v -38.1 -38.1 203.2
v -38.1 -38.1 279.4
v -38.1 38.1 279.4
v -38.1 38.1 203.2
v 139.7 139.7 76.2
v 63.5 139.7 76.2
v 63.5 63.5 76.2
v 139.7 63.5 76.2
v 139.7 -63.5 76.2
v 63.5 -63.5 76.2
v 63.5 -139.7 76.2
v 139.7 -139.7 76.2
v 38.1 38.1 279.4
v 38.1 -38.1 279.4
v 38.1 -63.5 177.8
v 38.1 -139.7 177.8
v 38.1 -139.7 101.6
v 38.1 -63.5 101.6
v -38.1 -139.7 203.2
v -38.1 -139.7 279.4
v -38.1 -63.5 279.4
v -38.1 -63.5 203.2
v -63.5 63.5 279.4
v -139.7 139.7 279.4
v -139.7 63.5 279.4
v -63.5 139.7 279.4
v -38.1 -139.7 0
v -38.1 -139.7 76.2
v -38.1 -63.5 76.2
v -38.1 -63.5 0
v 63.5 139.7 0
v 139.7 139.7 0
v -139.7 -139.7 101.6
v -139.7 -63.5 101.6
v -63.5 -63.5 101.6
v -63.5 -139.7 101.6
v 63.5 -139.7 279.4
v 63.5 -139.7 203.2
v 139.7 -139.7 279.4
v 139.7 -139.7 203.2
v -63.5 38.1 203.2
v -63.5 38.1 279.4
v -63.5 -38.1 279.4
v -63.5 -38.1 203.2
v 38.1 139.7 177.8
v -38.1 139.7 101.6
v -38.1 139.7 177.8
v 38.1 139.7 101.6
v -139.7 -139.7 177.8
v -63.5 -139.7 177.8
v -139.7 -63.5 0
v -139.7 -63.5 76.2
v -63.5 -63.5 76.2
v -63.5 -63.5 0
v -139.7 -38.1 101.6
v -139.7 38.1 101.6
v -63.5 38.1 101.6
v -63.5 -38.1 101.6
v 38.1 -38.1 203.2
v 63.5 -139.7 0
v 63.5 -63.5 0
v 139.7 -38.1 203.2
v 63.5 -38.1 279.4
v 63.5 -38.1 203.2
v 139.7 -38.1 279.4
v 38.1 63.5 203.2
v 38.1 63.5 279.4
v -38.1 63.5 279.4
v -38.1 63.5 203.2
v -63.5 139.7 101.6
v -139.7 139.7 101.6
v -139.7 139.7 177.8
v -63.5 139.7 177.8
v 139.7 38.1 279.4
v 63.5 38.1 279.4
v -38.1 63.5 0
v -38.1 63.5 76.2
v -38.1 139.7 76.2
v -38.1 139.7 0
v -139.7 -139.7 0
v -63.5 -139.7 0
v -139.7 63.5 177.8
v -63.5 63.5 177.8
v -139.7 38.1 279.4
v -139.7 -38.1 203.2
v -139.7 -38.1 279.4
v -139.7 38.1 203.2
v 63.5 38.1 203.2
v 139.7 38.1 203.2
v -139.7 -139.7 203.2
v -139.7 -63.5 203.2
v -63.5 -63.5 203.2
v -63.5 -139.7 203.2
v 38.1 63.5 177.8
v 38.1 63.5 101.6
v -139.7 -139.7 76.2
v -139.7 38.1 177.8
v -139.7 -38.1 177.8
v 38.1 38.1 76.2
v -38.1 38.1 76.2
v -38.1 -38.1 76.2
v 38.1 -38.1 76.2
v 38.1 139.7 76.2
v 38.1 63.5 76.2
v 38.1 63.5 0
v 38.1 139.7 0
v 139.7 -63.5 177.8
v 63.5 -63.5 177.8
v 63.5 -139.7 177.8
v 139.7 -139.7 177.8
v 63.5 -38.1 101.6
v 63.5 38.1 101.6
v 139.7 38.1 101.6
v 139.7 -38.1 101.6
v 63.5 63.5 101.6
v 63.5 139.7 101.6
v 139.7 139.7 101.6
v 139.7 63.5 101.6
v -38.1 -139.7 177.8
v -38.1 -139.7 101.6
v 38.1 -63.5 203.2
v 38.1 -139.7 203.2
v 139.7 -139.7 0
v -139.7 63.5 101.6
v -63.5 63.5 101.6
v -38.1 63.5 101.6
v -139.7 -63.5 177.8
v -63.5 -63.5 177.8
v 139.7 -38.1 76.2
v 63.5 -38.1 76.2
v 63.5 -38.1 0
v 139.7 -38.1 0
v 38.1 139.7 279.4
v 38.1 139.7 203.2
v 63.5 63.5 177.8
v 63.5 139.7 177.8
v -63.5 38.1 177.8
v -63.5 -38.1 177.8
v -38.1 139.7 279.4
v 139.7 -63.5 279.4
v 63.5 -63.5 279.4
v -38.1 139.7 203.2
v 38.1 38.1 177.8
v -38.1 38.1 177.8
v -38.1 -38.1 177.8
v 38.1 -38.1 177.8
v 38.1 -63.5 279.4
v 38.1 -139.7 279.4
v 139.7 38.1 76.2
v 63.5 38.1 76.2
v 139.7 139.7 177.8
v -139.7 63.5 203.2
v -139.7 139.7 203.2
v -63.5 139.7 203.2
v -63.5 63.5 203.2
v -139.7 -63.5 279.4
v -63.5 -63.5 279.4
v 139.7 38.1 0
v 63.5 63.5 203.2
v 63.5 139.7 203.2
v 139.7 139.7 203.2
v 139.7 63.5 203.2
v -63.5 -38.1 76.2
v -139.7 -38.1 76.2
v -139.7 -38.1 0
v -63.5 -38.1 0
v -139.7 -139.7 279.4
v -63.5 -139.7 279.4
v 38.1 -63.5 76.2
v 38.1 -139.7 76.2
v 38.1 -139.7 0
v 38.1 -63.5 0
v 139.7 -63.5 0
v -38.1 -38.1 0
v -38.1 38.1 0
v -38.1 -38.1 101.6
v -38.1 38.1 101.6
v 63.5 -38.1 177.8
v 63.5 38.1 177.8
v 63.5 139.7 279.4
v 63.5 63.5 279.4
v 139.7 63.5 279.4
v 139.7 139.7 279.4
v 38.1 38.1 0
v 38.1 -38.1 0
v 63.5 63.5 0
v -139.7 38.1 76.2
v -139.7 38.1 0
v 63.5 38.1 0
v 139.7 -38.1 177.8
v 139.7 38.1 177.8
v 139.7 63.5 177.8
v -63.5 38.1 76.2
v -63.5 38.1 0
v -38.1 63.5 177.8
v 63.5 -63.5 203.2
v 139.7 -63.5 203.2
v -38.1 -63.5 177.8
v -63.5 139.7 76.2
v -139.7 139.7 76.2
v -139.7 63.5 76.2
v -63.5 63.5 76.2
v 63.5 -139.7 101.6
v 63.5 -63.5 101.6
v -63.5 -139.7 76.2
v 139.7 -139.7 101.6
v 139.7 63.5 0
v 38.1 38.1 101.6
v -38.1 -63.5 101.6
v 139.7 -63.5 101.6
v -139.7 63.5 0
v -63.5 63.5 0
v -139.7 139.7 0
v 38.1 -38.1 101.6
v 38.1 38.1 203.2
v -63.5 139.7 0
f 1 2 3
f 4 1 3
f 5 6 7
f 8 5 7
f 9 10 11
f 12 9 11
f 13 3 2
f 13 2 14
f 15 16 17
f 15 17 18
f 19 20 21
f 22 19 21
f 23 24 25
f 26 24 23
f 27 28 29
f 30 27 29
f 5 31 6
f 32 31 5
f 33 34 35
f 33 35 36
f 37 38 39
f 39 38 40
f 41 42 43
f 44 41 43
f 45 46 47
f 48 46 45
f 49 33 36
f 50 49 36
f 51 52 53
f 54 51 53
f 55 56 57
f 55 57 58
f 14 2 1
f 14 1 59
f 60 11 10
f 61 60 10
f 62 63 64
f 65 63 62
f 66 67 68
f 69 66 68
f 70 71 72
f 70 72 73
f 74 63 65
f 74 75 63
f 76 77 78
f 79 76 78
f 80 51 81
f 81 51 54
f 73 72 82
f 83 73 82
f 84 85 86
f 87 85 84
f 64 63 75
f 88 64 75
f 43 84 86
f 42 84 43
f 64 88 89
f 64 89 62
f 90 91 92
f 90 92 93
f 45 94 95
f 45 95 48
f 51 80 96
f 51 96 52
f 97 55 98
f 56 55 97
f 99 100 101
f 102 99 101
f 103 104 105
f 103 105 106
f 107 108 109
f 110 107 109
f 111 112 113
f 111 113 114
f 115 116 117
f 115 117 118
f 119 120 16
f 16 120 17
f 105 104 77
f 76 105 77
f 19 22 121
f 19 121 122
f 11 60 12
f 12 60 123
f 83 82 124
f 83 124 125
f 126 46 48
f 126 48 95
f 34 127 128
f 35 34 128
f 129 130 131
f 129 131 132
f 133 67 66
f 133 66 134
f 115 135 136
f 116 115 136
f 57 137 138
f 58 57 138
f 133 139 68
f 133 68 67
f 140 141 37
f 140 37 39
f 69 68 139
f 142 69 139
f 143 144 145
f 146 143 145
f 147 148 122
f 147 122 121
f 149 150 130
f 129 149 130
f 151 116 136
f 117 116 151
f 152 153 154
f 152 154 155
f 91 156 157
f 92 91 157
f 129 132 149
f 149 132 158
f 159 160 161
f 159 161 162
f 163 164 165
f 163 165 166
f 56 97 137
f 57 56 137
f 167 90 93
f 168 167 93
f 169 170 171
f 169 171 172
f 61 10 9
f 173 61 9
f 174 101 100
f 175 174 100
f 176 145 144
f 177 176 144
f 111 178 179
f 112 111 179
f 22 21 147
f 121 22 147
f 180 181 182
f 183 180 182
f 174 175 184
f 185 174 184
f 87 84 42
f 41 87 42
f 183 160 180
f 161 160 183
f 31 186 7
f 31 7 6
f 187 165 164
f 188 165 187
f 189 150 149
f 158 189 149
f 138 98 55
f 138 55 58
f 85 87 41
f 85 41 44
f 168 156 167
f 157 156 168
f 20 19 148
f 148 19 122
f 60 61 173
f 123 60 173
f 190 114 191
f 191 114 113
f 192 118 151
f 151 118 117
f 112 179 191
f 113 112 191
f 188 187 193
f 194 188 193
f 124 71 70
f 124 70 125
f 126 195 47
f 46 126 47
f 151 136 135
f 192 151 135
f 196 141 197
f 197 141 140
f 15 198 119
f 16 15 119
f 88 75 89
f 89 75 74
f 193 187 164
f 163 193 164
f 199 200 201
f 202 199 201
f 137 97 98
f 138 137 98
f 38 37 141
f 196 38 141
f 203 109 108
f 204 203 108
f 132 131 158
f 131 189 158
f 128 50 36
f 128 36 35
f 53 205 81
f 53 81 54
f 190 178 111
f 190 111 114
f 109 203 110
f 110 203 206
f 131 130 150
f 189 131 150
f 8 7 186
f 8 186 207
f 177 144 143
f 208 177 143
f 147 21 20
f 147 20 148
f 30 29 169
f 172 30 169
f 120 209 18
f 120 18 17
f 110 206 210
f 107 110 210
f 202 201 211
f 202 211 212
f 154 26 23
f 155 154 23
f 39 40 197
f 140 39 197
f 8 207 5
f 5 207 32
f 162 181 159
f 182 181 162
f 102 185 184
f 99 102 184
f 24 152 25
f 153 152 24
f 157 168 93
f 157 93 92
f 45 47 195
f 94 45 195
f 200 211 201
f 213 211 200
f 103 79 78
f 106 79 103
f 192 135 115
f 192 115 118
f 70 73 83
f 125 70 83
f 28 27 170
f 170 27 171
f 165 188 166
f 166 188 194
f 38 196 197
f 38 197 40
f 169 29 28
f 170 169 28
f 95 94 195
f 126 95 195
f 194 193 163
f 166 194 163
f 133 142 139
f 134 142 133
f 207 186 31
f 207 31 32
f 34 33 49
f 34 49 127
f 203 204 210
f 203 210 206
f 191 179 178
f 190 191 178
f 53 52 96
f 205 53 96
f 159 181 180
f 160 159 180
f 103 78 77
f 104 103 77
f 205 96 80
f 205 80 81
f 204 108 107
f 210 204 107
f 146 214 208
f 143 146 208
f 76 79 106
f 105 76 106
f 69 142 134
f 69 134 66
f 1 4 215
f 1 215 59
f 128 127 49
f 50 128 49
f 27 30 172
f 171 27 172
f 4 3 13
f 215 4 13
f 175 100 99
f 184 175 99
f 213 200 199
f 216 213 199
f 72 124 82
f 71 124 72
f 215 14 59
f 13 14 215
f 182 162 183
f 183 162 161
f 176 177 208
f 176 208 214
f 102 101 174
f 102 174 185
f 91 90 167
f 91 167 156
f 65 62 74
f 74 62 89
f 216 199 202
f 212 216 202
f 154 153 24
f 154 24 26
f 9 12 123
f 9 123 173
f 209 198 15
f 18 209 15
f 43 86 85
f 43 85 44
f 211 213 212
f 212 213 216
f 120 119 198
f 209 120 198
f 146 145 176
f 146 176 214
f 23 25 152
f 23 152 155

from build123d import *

# Parameters (mm, degrees)
F0_W      = 279.4
F0_H      = 279.4
F1_DEPTH  = 279.4
F2_W      = 25.4
F2_H      = 76.2
F2_H_2    = 25.4
F2_W_2    = 76.2
F3_DEPTH  = 279.4
F4_W      = 76.2
F4_H      = 25.4
F5_DEPTH  = 533.4
F6_W      = 76.2
F6_H      = 25.4
F7_DEPTH  = 533.4
F8_W      = 76.2
F8_H      = 25.4
F9_DEPTH  = 81838.8
F10_W     = 76.2
F10_H     = 25.4
F11_DEPTH = 1752.6
F12_W     = 76.2
F12_H     = 25.4
F13_DEPTH = 50876.2
F14_W     = 76.2
F14_H     = 25.4
F15_DEPTH = 10668
F16_W     = 76.2
F16_H     = 25.4
F17_DEPTH = 33959.8
F18_W     = 76.2
F18_H     = 25.4
F19_DEPTH = 132969
F20_W     = 76.2
F20_H     = 25.4
F21_DEPTH = 50850.8


with BuildPart() as f1:
    # F0 (on Top) → F1 (new body)
    with BuildSketch(Plane.XY):
        Rectangle(F0_W, F0_H)
    extrude(amount=F1_DEPTH)

    # F2 (on face) → F3 (cut)
    with BuildSketch(Plane.XY.offset(279.4)):
        with Locations((-50.8, 101.6)):
            Rectangle(F2_W, F2_H)
        with Locations((-50.8, 50.8)):
            Rectangle(F2_W, F2_H_2)
        with Locations((-101.6, 50.8)):
            Rectangle(F2_W_2, F2_H_2)
        with Locations((0, 50.8)):
            Rectangle(F2_W_2, F2_H_2)
        with Locations((-50.8, 0)):
            Rectangle(F2_W, F2_H)
        with Locations((50.8, 50.8)):
            Rectangle(F2_W, F2_H_2)
        with Locations((50.8, 101.6)):
            Rectangle(F2_W, F2_H)
        with Locations((-50.8, -50.8)):
            Rectangle(F2_W, F2_H_2)
        with Locations((-101.6, -50.8)):
            Rectangle(F2_W_2, F2_H_2)
        with Locations((0, -50.8)):
            Rectangle(F2_W_2, F2_H_2)
        with Locations((50.8, 0)):
            Rectangle(F2_W, F2_H)
        with Locations((101.6, 50.8)):
            Rectangle(F2_W_2, F2_H_2)
        with Locations((-50.8, -101.6)):
            Rectangle(F2_W, F2_H)
        with Locations((50.8, -50.8)):
            Rectangle(F2_W, F2_H_2)
        with Locations((50.8, -101.6)):
            Rectangle(F2_W, F2_H)
        with Locations((101.6, -50.8)):
            Rectangle(F2_W_2, F2_H_2)
    extrude(amount=-F3_DEPTH, mode=Mode.SUBTRACT)

    # F4 (on face) → F5 (cut)
    with BuildSketch(Plane(origin=(-139.7, 0, 0), x_dir=(0, -1, 0), z_dir=(-1, 0, 0))):
        with Locations((-101.6, 190.5)):
            Rectangle(F4_W, F4_H)
        with Locations((-101.6, 88.9)):
            Rectangle(F4_W, F4_H)
    extrude(amount=-F5_DEPTH, mode=Mode.SUBTRACT)

    # F6 (on face) → F7 (cut)
    with BuildSketch(Plane(origin=(-38.1, 0, 0), x_dir=(0, -1, 0), z_dir=(-1, 0, 0))):
        with Locations((-101.6, 190.5)):
            Rectangle(F6_W, F6_H)
        with Locations((-101.6, 88.9)):
            Rectangle(F6_W, F6_H)
    extrude(amount=-F7_DEPTH, mode=Mode.SUBTRACT)

    # F8 (on face) → F9 (cut)
    with BuildSketch(Plane(origin=(63.5, 0, 0), x_dir=(0, -1, 0), z_dir=(-1, 0, 0))):
        with Locations((-101.6, 190.5)):
            Rectangle(F8_W, F8_H)
        with Locations((-101.6, 88.9)):
            Rectangle(F8_W, F8_H)
    extrude(amount=-F9_DEPTH, mode=Mode.SUBTRACT)

    # F10 (on face) → F11 (cut)
    with BuildSketch(Plane(origin=(-139.7, 0, 0), x_dir=(0, -1, 0), z_dir=(-1, 0, 0))):
        with Locations((0, 190.5)):
            Rectangle(F10_W, F10_H)
        with Locations((0, 88.9)):
            Rectangle(F10_W, F10_H)
    extrude(amount=-F11_DEPTH, mode=Mode.SUBTRACT)

    # F12 (on face) → F13 (cut)
    with BuildSketch(Plane(origin=(-38.1, 0, 0), x_dir=(0, -1, 0), z_dir=(-1, 0, 0))):
        with Locations((0, 190.5)):
            Rectangle(F12_W, F12_H)
        with Locations((0, 88.9)):
            Rectangle(F12_W, F12_H)
    extrude(amount=-F13_DEPTH, mode=Mode.SUBTRACT)

    # F14 (on face) → F15 (cut)
    with BuildSketch(Plane(origin=(63.5, 0, 0), x_dir=(0, -1, 0), z_dir=(-1, 0, 0))):
        with Locations((0, 190.5)):
            Rectangle(F14_W, F14_H)
        with Locations((0, 88.9)):
            Rectangle(F14_W, F14_H)
    extrude(amount=-F15_DEPTH, mode=Mode.SUBTRACT)

    # F16 (on face) → F17 (cut)
    with BuildSketch(Plane(origin=(-139.7, 0, 0), x_dir=(0, -1, 0), z_dir=(-1, 0, 0))):
        with Locations((101.6, 190.5)):
            Rectangle(F16_W, F16_H)
        with Locations((101.6, 88.9)):
            Rectangle(F16_W, F16_H)
    extrude(amount=-F17_DEPTH, mode=Mode.SUBTRACT)

    # F18 (on face) → F19 (cut)
    with BuildSketch(Plane(origin=(-38.1, 0, 0), x_dir=(0, -1, 0), z_dir=(-1, 0, 0))):
        with Locations((101.6, 190.5)):
            Rectangle(F18_W, F18_H)
        with Locations((101.6, 88.9)):
            Rectangle(F18_W, F18_H)
    extrude(amount=-F19_DEPTH, mode=Mode.SUBTRACT)

    # F20 (on face) → F21 (cut)
    with BuildSketch(Plane(origin=(63.5, 0, 0), x_dir=(0, -1, 0), z_dir=(-1, 0, 0))):
        with Locations((101.6, 190.5)):
            Rectangle(F20_W, F20_H)
        with Locations((101.6, 88.9)):
            Rectangle(F20_W, F20_H)
    extrude(amount=-F21_DEPTH, mode=Mode.SUBTRACT)


solid = f1.part
